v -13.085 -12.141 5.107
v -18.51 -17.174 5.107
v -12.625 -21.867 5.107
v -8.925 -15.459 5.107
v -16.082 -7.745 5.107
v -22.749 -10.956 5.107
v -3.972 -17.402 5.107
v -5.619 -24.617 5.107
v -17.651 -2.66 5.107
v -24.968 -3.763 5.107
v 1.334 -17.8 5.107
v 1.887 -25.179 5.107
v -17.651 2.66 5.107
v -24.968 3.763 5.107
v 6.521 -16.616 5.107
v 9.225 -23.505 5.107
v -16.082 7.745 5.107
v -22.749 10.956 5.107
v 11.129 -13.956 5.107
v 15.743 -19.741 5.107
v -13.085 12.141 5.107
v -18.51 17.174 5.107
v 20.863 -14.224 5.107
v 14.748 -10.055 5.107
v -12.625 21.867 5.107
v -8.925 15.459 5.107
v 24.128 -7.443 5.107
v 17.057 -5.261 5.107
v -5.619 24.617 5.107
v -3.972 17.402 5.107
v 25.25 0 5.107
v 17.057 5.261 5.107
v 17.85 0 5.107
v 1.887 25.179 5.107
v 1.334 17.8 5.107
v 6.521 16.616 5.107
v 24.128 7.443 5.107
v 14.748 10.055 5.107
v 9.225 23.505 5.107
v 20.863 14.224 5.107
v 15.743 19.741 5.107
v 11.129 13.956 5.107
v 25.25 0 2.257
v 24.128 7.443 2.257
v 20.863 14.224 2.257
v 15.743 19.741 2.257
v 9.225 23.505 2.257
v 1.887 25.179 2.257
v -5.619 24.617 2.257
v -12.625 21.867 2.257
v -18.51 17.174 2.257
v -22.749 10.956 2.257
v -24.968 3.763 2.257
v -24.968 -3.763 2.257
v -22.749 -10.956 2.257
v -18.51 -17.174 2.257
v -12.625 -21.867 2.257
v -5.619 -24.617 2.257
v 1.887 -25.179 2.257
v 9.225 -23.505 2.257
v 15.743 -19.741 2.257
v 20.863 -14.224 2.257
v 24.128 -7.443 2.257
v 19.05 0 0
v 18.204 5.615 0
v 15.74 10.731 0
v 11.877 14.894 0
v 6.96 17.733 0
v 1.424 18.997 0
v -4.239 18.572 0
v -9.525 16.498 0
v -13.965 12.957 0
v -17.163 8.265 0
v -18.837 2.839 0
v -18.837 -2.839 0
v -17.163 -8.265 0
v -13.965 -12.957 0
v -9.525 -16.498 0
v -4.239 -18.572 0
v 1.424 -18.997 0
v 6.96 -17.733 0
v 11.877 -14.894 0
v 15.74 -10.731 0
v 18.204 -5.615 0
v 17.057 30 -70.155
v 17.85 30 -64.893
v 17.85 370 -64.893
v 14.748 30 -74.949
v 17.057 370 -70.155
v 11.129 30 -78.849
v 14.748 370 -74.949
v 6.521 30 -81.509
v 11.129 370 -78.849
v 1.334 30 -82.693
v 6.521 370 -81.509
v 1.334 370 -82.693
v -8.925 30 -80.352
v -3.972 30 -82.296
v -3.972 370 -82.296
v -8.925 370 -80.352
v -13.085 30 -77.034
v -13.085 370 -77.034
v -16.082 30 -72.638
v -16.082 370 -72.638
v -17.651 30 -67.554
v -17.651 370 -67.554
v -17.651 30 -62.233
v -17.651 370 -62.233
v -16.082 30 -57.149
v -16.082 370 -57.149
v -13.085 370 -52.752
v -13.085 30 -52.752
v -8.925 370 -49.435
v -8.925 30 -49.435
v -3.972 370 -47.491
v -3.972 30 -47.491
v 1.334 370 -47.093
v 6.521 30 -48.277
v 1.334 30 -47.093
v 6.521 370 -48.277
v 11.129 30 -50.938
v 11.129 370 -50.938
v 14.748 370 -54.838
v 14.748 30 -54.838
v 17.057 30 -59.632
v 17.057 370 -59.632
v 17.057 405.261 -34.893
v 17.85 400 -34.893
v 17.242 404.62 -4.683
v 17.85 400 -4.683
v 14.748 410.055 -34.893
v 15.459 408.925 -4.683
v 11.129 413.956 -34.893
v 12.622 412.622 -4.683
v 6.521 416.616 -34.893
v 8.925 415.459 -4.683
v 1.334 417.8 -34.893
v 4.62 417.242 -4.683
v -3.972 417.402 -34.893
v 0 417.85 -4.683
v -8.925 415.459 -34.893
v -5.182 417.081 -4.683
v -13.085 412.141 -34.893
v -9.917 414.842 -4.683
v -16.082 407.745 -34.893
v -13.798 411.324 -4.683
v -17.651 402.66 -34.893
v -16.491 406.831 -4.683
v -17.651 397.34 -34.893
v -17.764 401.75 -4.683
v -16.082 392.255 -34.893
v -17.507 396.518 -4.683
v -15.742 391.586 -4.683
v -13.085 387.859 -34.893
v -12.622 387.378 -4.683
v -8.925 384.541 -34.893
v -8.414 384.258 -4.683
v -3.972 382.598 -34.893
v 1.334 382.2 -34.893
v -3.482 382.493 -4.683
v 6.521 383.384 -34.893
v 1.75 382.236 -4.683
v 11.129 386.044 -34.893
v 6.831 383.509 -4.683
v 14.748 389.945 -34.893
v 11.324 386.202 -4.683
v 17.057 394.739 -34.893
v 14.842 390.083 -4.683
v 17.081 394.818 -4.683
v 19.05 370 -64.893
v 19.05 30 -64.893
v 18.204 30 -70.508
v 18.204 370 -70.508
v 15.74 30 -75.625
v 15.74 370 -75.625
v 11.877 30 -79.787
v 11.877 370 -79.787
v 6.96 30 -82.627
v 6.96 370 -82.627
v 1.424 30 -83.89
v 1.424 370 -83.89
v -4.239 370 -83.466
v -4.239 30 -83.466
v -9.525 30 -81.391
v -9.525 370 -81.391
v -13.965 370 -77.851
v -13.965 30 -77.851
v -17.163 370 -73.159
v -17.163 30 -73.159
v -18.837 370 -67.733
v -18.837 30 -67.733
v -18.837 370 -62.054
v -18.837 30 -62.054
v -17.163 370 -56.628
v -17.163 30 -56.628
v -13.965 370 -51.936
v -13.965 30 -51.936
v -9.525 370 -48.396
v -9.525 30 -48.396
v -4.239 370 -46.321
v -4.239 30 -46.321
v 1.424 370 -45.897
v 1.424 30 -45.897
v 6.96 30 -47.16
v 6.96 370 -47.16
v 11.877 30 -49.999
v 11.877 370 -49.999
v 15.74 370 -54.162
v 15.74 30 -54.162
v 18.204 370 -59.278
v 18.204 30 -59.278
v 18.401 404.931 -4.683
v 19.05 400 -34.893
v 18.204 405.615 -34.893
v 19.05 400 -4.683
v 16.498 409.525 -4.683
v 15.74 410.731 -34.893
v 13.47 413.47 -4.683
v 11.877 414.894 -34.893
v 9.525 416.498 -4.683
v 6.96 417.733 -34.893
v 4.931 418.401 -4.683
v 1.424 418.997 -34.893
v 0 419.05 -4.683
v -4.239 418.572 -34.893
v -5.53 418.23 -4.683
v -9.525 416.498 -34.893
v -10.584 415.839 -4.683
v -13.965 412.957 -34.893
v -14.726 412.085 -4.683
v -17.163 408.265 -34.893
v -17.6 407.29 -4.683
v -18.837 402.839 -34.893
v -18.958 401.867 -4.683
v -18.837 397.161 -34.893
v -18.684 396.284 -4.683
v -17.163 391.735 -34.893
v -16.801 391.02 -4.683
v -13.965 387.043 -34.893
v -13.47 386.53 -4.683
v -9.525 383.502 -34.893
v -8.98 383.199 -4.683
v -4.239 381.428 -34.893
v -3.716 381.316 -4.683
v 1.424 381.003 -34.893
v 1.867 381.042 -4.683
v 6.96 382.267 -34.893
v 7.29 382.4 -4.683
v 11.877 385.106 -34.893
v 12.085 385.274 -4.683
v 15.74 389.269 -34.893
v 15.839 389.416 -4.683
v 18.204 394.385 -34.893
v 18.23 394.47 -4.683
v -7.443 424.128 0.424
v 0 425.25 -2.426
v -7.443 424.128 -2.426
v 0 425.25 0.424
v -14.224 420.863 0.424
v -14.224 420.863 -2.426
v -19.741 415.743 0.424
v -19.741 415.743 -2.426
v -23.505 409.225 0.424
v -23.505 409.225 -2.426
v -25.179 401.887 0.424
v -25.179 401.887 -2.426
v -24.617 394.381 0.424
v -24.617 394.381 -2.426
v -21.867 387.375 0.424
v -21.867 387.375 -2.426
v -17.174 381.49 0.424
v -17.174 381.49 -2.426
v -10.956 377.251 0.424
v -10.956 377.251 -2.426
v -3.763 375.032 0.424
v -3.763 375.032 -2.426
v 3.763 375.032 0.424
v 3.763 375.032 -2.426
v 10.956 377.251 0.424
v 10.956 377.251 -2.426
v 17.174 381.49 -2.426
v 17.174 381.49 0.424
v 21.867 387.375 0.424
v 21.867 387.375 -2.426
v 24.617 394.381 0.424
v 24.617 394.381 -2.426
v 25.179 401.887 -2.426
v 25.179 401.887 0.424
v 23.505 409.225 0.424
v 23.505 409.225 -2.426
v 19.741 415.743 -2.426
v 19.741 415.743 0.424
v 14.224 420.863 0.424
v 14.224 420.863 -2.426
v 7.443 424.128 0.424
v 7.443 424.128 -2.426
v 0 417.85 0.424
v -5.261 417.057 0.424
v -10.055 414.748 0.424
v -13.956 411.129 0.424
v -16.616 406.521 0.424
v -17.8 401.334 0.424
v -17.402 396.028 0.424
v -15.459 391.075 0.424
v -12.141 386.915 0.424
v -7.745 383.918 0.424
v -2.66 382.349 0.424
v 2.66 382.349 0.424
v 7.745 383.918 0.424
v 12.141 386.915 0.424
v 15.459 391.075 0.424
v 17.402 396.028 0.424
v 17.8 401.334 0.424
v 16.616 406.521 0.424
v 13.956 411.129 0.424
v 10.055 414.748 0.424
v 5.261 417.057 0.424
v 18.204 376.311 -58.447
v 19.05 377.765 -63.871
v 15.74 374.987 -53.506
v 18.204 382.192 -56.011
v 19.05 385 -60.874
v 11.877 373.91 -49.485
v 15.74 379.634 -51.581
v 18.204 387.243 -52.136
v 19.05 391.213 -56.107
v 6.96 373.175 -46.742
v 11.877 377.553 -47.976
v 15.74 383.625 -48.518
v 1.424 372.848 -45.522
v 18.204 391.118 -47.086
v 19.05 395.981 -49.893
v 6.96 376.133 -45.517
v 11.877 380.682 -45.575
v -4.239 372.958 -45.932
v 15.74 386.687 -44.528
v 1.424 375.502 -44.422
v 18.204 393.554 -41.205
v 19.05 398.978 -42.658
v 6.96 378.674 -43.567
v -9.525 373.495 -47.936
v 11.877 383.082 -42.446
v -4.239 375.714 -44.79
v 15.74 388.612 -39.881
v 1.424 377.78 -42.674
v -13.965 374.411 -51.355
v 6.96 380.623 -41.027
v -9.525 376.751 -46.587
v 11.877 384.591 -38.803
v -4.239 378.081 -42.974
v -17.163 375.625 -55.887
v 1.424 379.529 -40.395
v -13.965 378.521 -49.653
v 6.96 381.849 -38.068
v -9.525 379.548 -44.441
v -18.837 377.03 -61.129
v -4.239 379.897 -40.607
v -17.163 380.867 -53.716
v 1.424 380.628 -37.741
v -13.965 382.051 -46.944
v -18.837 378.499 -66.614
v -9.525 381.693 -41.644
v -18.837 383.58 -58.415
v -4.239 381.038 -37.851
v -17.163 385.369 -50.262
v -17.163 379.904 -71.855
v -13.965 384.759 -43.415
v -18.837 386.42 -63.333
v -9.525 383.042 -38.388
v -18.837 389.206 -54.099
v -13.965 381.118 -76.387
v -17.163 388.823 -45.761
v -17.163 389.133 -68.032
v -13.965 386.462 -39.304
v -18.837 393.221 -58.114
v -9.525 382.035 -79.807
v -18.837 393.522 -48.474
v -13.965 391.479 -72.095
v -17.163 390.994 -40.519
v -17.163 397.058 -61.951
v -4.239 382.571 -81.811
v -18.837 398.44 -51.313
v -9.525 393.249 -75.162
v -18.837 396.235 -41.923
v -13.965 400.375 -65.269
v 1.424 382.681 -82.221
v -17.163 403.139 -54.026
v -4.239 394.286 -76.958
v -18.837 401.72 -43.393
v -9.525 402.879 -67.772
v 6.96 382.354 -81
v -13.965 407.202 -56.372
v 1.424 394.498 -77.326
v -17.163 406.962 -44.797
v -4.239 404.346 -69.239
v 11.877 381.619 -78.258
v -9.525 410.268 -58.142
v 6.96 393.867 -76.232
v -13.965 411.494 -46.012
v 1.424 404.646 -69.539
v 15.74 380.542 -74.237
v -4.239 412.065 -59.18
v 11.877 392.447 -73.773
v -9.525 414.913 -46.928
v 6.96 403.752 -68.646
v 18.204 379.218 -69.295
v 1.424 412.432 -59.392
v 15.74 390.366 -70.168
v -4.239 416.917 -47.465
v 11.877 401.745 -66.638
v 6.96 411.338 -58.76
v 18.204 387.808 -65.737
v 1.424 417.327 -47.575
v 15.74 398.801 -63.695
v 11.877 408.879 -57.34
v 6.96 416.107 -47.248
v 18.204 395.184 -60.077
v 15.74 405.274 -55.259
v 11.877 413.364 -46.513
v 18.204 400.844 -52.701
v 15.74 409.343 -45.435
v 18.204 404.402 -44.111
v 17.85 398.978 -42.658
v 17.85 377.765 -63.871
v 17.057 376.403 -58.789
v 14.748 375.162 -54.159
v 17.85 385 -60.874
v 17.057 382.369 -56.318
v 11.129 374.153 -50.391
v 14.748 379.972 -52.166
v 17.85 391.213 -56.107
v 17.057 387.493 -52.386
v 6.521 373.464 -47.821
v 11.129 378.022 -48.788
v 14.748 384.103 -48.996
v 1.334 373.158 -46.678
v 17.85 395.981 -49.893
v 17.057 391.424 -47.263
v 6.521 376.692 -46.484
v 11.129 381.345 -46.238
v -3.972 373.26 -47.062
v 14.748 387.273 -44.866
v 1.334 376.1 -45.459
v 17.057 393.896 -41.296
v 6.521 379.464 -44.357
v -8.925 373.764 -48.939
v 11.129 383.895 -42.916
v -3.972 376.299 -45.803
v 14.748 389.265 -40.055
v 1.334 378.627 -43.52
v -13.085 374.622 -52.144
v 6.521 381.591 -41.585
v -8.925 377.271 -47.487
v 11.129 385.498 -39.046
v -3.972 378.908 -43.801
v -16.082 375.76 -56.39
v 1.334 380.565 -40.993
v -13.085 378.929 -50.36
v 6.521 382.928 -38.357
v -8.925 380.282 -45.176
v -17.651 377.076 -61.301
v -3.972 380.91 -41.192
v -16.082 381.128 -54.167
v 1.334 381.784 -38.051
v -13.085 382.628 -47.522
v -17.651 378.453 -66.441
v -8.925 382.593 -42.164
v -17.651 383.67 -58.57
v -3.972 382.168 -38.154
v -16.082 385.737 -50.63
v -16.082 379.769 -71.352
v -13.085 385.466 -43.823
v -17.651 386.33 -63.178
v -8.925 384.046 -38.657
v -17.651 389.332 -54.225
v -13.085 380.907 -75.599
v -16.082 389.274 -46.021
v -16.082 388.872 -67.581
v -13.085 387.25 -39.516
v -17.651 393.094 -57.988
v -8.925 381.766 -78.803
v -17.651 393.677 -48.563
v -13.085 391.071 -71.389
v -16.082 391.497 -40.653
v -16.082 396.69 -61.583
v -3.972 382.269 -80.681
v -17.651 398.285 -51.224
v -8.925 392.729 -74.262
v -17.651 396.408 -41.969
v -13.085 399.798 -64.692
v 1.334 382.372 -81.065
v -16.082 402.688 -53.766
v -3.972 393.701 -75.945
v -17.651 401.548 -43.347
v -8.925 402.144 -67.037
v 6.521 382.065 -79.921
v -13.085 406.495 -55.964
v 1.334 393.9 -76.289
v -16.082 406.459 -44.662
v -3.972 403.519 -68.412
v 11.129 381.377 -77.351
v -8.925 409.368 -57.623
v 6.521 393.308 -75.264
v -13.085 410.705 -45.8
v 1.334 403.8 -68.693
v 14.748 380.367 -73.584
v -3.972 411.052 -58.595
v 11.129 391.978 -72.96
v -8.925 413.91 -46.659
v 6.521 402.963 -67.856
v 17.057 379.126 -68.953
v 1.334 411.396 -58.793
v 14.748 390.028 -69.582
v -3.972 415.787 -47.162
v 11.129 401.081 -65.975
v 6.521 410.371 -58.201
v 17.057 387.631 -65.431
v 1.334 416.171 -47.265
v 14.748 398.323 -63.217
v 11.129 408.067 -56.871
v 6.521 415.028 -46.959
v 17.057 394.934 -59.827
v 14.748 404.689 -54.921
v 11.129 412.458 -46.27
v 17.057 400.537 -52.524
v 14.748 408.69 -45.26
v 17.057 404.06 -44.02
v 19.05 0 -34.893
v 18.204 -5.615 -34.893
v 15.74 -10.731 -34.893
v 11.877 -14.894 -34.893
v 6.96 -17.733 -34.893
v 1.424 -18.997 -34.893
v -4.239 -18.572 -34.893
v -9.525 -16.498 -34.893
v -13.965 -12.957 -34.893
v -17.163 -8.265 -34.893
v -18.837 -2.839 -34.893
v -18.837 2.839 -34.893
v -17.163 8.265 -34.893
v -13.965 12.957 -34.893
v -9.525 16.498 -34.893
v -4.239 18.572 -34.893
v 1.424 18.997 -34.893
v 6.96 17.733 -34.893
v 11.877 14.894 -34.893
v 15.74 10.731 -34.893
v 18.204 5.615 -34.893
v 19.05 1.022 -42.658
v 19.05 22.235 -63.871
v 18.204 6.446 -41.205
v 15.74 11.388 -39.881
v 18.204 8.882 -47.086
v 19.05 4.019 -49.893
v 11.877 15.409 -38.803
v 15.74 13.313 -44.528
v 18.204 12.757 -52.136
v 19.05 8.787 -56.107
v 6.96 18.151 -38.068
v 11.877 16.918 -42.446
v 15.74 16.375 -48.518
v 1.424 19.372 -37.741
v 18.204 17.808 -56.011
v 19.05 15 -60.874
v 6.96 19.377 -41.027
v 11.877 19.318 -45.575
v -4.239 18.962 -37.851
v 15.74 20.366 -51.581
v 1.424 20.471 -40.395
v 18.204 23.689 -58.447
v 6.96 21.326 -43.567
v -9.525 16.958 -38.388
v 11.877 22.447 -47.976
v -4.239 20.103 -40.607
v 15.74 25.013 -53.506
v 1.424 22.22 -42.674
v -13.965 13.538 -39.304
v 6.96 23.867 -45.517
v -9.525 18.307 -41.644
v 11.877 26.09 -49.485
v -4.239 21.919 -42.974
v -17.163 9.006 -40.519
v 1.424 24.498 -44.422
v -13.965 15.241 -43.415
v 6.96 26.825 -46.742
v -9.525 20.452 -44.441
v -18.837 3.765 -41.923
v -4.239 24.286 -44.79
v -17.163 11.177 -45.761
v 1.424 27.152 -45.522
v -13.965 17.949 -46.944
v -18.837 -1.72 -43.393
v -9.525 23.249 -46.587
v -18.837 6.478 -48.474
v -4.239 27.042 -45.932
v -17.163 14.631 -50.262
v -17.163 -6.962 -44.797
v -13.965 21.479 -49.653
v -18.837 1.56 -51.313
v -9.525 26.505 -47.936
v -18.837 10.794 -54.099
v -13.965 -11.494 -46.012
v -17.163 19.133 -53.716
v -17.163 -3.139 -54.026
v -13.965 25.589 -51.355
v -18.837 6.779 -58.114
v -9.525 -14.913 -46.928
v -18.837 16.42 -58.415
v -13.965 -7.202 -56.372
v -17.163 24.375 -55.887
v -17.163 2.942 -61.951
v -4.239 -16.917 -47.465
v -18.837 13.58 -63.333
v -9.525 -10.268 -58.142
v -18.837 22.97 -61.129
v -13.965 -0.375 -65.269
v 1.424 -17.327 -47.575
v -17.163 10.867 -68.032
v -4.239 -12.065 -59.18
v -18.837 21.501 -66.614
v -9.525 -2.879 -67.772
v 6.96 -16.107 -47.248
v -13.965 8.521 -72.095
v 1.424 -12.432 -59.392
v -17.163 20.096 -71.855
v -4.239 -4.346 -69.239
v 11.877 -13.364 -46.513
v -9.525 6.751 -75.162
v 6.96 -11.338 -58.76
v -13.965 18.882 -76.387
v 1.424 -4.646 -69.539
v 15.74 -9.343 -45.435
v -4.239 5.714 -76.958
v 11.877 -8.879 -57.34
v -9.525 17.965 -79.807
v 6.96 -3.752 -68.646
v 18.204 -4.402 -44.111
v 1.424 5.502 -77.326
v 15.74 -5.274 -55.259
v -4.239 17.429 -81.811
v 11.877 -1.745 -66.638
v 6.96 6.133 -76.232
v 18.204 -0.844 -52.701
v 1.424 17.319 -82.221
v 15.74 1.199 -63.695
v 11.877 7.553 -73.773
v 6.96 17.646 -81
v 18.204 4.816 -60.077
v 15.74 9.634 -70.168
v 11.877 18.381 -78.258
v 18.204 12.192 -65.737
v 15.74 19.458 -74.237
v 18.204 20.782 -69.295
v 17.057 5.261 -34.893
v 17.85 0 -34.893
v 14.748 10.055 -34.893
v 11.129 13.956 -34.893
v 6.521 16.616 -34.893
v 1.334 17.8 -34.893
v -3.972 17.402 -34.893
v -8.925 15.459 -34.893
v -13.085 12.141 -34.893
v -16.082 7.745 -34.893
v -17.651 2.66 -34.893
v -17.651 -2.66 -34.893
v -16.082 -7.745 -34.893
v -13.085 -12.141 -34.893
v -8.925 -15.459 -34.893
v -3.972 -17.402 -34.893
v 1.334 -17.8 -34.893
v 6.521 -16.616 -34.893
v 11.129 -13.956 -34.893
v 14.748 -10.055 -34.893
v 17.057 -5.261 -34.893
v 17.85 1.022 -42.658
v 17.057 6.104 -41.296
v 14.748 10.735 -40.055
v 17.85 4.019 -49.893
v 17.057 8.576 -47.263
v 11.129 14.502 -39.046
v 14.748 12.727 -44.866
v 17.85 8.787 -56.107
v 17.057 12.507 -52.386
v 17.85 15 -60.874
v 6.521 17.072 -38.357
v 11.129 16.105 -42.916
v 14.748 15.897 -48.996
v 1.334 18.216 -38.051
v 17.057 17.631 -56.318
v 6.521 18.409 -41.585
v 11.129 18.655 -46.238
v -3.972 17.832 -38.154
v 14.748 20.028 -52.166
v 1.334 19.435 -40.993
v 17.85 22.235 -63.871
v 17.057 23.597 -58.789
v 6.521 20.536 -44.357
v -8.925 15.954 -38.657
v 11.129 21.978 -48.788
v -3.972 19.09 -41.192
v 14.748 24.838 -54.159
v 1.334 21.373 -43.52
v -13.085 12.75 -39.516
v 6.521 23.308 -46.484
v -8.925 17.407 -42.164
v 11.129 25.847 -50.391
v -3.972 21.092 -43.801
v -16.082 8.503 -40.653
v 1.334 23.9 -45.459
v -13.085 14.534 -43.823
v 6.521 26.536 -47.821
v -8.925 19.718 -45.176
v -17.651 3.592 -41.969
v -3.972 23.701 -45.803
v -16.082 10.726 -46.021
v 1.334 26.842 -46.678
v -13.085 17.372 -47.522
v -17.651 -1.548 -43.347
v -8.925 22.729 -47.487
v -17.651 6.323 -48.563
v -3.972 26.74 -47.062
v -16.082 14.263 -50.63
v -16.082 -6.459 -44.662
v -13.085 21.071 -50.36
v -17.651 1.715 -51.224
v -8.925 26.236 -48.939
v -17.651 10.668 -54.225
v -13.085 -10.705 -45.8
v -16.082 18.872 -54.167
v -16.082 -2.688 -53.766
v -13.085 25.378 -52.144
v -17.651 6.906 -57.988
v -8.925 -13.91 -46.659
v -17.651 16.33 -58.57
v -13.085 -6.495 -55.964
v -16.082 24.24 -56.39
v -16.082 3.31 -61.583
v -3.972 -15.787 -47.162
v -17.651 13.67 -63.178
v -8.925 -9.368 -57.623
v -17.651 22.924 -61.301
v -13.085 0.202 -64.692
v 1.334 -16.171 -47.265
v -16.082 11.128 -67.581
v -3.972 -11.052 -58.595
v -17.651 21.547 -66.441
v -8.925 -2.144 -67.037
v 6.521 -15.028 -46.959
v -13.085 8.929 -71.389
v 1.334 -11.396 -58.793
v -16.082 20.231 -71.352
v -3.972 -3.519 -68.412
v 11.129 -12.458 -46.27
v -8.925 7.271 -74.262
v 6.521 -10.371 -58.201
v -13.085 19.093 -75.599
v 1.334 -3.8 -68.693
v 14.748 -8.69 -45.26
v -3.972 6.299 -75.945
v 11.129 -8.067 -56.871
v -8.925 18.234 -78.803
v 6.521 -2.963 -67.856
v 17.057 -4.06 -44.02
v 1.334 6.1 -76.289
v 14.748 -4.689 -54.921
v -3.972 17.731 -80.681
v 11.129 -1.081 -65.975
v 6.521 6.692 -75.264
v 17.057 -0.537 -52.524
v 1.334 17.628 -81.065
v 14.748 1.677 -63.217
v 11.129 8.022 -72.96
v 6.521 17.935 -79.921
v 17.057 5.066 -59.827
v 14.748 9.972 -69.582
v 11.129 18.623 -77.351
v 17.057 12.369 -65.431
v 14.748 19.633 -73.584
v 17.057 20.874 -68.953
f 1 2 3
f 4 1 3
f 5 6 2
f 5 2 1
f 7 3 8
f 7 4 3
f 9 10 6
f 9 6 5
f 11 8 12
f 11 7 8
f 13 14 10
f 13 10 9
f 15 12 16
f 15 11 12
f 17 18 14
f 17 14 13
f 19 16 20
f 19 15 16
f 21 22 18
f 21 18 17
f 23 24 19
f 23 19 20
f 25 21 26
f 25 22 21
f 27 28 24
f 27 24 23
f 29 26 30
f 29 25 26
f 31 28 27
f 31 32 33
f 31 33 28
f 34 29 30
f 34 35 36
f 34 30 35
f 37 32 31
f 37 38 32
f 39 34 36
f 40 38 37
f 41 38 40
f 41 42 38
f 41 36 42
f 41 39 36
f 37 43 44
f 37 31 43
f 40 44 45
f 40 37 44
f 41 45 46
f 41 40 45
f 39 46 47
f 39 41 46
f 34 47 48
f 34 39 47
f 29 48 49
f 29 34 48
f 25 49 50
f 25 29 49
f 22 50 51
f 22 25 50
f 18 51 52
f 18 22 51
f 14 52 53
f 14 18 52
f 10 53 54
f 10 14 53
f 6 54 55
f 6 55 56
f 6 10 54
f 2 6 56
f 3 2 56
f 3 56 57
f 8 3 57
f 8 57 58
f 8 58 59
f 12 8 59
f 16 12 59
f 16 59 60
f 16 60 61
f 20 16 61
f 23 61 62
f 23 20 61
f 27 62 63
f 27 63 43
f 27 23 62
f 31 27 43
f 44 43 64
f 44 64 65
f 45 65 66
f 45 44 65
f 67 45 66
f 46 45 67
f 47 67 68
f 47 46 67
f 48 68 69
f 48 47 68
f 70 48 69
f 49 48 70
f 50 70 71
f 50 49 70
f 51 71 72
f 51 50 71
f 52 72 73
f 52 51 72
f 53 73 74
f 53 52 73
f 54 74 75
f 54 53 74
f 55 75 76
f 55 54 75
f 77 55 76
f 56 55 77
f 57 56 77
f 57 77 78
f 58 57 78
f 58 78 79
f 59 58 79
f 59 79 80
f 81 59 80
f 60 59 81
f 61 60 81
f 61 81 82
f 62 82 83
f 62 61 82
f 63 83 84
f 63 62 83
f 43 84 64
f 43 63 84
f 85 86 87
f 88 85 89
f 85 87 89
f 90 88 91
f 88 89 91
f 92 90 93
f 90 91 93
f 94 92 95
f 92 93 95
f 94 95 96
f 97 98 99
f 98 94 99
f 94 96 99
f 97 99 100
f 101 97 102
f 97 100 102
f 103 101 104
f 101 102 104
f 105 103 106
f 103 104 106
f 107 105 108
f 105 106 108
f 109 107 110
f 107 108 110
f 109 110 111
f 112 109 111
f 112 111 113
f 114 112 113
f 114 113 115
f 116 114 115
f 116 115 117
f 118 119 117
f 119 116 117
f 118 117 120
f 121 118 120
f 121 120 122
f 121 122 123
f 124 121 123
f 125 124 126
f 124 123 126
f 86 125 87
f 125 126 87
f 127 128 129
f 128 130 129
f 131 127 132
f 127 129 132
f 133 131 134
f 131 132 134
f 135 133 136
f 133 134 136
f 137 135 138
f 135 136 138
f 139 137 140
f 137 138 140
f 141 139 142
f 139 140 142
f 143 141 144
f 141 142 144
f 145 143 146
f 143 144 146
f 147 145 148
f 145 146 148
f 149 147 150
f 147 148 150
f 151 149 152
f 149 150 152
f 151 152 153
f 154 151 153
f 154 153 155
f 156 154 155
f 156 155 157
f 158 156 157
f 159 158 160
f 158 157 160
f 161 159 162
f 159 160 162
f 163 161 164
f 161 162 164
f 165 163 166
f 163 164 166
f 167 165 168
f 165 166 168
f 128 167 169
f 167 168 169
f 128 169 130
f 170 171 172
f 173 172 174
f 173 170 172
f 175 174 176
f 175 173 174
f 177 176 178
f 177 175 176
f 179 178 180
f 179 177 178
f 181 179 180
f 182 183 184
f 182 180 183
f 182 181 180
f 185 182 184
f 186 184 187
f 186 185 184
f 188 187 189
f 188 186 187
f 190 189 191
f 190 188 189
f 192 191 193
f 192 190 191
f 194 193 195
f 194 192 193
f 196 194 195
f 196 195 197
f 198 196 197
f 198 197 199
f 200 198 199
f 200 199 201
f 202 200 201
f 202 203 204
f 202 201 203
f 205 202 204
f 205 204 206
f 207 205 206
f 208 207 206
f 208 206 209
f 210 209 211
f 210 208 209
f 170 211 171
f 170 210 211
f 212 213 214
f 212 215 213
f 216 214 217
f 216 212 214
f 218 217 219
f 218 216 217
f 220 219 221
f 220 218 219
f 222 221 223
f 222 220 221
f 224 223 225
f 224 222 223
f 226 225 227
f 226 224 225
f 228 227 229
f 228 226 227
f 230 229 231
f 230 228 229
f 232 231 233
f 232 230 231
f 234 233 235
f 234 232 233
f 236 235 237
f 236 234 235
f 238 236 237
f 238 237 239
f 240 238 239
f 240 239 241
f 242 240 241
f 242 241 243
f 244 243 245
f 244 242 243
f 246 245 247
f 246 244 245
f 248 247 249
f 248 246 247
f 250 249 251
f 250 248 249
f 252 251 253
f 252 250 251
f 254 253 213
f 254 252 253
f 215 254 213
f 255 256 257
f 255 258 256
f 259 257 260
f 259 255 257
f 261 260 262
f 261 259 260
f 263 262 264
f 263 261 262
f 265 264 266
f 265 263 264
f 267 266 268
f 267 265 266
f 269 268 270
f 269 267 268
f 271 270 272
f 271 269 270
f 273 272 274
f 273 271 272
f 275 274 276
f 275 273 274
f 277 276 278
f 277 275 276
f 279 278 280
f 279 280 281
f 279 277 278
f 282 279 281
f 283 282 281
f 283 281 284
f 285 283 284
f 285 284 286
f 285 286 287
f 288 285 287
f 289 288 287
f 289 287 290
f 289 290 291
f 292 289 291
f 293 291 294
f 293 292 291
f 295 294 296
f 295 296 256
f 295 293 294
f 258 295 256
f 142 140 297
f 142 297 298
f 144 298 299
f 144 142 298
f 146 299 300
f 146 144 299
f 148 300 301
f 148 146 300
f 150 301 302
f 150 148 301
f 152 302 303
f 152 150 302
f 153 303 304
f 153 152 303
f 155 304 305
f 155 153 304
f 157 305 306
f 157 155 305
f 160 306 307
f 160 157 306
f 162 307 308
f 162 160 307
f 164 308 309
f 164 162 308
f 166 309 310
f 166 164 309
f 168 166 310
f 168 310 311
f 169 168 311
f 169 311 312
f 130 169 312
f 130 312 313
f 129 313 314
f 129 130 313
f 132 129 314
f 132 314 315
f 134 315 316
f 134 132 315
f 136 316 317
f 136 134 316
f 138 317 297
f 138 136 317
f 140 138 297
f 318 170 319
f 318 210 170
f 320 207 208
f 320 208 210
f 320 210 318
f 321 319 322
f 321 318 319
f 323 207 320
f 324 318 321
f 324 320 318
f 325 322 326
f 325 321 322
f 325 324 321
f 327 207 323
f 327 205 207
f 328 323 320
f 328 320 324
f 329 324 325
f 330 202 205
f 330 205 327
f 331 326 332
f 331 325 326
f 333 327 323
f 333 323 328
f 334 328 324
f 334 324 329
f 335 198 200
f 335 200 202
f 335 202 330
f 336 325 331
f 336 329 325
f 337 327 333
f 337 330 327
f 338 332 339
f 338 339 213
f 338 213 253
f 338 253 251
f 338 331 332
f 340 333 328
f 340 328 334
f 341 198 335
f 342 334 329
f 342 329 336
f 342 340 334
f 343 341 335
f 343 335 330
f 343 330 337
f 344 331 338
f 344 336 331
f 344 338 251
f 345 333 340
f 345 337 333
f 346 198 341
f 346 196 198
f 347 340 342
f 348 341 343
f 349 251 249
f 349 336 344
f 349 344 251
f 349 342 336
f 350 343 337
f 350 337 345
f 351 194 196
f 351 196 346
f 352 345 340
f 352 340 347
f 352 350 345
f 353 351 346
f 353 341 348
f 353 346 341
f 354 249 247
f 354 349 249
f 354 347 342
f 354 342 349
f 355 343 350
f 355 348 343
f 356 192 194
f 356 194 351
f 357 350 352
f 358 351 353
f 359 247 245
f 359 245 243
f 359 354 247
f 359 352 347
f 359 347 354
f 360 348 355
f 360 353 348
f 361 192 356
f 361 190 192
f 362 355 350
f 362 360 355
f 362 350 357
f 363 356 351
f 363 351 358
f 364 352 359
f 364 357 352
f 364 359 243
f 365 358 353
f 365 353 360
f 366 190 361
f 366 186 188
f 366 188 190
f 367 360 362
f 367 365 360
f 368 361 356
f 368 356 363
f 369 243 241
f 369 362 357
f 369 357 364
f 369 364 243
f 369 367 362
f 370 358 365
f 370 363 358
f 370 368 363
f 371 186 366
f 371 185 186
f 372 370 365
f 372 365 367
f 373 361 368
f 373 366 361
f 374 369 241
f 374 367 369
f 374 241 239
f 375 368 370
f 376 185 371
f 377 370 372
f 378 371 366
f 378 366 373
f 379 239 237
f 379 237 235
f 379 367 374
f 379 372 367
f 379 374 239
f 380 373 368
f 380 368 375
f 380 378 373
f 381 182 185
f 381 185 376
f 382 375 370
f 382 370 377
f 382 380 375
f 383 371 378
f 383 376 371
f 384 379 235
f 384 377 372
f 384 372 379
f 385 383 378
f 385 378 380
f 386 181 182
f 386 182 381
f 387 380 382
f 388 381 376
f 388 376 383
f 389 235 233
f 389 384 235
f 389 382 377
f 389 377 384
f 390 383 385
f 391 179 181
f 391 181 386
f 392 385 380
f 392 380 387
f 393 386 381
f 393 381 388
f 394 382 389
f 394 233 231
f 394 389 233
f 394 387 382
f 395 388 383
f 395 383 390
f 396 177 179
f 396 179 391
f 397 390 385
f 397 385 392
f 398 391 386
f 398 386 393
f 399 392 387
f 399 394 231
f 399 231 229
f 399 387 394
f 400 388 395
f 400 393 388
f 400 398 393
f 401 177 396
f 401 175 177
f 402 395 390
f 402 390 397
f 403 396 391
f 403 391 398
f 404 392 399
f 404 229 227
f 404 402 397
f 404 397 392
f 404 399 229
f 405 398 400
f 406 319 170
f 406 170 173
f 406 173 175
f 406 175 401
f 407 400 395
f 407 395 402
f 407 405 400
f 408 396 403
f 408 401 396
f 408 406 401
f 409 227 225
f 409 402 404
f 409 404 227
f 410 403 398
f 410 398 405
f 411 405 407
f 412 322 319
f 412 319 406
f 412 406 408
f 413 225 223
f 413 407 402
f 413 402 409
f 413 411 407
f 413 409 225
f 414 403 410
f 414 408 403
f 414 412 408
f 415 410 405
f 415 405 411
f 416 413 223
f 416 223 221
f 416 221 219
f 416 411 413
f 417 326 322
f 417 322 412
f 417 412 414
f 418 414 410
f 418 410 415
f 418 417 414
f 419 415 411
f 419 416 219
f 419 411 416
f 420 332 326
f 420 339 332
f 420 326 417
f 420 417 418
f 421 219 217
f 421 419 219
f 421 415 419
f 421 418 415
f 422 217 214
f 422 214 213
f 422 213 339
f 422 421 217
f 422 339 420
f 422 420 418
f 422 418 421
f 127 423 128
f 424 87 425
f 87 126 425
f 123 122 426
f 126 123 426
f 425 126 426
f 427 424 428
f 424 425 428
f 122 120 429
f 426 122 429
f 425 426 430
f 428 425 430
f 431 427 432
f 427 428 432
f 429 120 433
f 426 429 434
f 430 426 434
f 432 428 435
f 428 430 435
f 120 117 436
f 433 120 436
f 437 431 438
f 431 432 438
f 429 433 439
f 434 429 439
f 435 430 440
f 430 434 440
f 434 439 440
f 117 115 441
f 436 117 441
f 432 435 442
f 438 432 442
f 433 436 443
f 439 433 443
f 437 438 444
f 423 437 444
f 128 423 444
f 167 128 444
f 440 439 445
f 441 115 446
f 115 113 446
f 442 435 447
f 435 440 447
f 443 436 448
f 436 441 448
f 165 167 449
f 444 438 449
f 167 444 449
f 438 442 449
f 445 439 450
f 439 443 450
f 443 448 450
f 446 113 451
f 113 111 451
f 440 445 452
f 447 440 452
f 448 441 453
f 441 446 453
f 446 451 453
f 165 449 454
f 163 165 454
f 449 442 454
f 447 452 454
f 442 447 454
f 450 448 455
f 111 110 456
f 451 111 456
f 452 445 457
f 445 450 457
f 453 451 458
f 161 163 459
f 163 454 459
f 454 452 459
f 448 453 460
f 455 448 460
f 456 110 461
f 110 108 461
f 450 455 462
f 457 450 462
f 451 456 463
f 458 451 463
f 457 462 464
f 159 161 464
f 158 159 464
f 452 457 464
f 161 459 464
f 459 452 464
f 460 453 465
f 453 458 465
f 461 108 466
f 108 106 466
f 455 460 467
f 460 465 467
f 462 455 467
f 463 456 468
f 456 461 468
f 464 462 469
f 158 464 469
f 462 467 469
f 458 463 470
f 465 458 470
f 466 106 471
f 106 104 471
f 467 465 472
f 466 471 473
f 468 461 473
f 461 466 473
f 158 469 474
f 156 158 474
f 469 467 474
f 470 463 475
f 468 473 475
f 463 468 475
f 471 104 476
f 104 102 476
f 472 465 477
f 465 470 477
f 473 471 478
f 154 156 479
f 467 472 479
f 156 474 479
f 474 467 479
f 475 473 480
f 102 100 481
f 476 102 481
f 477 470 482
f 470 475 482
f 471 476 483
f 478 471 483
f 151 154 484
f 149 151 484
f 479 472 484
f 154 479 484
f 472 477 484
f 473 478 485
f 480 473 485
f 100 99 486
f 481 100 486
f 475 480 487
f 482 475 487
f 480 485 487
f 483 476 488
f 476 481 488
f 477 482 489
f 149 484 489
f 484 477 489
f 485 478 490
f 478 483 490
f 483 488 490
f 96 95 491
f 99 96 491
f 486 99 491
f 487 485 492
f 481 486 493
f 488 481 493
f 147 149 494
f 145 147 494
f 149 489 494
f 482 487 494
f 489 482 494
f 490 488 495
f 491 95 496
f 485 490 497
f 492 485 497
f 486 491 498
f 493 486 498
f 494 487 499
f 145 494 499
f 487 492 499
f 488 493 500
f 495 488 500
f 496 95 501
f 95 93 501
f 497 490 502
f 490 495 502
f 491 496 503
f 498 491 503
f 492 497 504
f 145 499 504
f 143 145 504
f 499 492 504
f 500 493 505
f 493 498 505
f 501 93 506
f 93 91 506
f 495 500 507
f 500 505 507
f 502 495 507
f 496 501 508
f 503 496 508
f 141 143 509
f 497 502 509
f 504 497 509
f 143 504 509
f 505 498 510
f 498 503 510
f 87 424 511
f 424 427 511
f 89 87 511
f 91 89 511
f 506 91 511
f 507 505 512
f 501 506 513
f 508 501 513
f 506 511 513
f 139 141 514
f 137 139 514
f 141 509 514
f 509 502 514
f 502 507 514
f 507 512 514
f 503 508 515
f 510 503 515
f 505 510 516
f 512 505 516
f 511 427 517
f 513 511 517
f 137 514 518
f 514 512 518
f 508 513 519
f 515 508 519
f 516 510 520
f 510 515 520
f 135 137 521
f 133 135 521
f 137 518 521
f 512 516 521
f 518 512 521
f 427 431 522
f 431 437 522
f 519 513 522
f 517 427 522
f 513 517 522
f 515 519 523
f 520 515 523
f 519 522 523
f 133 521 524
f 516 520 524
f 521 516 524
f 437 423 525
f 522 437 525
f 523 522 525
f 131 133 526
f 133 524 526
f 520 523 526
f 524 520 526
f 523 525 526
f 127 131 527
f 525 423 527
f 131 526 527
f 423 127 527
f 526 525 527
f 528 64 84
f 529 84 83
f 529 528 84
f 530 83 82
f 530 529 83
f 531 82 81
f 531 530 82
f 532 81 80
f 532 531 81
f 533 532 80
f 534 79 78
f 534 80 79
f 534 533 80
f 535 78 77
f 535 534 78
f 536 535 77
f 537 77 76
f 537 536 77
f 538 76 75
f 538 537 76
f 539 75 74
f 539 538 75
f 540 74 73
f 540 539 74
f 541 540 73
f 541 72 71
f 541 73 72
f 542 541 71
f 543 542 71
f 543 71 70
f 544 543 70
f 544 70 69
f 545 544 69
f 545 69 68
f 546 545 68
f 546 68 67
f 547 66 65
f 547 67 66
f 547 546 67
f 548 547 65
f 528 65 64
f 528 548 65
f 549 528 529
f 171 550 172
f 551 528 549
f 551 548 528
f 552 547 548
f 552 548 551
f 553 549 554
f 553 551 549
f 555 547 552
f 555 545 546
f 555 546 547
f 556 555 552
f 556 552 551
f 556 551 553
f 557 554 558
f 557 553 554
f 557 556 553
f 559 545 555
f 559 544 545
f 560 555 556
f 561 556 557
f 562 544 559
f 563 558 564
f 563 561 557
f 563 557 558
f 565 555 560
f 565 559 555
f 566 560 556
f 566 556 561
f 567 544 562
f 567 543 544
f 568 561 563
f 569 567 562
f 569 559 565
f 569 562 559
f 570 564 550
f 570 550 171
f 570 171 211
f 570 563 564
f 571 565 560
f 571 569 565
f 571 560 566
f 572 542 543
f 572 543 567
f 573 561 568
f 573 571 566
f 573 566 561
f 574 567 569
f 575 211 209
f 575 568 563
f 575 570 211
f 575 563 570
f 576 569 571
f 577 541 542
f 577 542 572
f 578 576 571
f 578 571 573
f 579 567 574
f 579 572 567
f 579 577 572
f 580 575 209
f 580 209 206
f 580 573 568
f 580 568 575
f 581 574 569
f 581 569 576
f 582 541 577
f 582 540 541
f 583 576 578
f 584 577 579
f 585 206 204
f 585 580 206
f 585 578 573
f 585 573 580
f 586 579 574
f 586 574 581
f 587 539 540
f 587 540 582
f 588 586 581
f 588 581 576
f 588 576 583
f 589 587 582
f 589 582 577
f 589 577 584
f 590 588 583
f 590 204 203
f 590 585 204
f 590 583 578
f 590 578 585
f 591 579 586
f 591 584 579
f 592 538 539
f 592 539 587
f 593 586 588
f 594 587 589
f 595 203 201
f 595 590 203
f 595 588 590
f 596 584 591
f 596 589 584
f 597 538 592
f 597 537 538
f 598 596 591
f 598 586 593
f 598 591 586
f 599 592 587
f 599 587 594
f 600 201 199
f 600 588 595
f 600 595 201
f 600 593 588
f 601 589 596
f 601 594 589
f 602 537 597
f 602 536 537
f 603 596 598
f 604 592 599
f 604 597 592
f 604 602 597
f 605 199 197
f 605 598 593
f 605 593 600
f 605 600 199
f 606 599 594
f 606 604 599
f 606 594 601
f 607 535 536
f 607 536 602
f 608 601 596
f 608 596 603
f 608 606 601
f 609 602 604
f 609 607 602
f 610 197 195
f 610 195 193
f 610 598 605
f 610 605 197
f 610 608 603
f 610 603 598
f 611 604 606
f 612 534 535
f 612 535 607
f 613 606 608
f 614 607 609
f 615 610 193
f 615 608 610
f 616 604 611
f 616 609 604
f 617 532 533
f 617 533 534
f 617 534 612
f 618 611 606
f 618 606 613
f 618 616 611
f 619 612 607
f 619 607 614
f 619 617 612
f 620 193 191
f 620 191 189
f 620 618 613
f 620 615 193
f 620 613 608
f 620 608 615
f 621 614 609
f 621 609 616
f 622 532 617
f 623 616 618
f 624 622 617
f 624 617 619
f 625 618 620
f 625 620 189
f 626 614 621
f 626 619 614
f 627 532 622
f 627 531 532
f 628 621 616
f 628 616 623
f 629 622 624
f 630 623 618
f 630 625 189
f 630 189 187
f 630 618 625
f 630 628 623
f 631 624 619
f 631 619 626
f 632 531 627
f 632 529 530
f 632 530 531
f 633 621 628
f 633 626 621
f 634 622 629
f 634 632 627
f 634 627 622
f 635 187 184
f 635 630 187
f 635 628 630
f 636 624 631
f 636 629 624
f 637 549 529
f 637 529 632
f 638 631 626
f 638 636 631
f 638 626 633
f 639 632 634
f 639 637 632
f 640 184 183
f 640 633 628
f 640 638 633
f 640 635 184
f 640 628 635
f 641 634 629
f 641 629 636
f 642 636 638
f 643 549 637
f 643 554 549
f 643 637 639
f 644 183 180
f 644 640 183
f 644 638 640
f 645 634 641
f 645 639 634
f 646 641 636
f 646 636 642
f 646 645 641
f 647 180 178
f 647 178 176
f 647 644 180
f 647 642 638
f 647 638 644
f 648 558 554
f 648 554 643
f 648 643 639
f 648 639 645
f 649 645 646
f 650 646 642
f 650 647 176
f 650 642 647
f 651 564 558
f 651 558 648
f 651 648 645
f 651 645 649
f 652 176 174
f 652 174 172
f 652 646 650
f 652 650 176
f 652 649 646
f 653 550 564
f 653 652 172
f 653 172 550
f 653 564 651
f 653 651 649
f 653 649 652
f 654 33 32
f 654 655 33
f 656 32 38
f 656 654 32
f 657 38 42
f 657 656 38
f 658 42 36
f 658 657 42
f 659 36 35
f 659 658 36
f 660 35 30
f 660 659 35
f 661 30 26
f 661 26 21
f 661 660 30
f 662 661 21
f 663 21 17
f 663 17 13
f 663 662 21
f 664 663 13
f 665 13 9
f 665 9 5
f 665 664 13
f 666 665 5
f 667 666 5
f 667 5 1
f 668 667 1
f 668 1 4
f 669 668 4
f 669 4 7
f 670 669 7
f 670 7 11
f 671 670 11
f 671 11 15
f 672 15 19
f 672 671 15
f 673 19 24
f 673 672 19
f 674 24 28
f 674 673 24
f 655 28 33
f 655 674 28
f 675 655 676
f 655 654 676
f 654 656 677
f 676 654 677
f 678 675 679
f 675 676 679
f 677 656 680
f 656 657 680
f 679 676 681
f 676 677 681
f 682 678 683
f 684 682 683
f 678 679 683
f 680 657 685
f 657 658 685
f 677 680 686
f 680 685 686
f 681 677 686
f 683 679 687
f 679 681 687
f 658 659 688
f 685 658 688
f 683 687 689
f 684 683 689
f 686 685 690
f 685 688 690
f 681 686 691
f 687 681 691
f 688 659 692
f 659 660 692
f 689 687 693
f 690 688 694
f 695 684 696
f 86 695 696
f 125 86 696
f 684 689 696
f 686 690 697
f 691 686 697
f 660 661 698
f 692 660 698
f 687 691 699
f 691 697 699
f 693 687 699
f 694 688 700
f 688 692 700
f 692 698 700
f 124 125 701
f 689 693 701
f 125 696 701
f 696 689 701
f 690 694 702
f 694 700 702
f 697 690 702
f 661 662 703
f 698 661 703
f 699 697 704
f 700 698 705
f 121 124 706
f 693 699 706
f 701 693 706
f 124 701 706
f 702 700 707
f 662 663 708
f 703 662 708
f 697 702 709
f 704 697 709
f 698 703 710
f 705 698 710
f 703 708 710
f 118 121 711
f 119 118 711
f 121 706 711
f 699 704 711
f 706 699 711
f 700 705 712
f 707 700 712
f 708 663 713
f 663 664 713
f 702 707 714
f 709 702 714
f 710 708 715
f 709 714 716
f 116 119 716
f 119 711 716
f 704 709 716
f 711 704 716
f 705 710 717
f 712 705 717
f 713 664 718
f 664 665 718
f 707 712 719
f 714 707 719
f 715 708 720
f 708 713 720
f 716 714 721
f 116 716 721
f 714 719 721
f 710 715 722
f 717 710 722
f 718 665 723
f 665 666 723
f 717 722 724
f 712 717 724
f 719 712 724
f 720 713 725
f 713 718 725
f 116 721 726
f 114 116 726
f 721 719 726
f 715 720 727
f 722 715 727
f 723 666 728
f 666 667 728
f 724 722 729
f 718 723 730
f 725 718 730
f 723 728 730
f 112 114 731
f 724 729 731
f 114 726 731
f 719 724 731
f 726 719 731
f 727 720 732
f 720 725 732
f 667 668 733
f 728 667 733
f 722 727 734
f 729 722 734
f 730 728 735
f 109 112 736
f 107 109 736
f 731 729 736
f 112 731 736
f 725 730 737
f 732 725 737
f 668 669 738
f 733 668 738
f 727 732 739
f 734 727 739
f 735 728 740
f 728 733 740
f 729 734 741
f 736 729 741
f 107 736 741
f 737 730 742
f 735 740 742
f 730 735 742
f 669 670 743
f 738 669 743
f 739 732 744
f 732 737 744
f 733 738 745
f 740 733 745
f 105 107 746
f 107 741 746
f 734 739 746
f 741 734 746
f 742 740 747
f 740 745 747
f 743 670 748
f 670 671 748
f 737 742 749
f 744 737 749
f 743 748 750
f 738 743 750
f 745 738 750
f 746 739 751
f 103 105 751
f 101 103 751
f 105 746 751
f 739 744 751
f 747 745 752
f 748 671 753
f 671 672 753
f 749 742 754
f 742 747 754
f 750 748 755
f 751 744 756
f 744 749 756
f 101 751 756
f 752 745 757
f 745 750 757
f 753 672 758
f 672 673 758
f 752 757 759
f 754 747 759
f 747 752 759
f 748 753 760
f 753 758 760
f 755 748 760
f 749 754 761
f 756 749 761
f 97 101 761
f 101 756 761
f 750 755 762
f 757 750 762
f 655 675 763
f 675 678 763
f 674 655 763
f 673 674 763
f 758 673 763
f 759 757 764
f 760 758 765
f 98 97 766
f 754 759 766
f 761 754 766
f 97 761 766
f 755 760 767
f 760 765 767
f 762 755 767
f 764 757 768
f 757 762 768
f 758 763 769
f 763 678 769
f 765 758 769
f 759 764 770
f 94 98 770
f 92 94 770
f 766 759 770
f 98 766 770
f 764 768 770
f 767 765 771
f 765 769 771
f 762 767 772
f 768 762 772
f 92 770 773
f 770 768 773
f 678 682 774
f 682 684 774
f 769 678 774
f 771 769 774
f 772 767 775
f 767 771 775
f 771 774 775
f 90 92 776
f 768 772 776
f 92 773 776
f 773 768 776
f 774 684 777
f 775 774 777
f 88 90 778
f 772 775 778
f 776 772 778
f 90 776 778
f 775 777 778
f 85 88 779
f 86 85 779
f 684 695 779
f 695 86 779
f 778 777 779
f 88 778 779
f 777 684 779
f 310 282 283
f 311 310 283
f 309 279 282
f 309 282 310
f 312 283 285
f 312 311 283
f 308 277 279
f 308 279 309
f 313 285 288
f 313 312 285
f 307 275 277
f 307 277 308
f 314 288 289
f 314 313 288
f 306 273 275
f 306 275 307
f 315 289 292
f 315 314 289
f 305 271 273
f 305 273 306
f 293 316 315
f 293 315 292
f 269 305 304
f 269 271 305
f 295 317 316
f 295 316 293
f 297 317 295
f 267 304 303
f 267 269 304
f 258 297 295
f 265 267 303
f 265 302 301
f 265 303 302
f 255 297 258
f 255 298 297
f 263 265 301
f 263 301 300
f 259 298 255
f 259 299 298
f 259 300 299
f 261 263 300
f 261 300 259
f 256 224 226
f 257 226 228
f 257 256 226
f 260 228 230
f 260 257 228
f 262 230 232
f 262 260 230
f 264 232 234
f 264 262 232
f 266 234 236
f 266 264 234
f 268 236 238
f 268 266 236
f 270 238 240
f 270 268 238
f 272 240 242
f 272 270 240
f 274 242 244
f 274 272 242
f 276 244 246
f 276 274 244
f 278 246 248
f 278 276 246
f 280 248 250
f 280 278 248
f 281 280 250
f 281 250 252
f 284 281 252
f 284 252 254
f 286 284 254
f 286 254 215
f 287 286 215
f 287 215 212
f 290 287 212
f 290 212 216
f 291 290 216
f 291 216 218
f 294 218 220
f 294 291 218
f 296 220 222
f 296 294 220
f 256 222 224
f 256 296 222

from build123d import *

# Parameters (mm, degrees)
F2_R   = 19.05
F2_R_2 = 17.85


with BuildPart() as f1:
    # F0 (on Front) → F1 (revolve)
    with BuildSketch(Plane.XZ):
        Polygon((17.85, 5.1066154525), (17.85, 0), (19.05, 0), (25.25, 2.2566154525), (25.25, 5.1066154525), align=None)
    revolve(axis=Axis((0, 0, 5.6449943222), (0, 0, 1)))

    # F4: sweep along a path in F3
    with BuildLine(Plane.YZ) as f4_path:
        Line((0, 0), (0, -34.8933845475))
        ThreePointArc((0, -34.8933845475), (8.7867965644, -56.1065879831), (30, -64.8933845475))
        Line((30, -64.8933845475), (370, -64.8933845475))
        ThreePointArc((370, -64.8933845475), (391.2132034356, -56.1065879831), (400, -34.8933845475))
        Line((400, -34.8933845475), (400, -4.6830023639))
    # F2 (on Top) → F4 (sweep)
    with BuildSketch(Plane.XY):
        Circle(F2_R)
        Circle(F2_R_2, mode=Mode.SUBTRACT)
    sweep(path=f4_path.line)

    # F5 (on Right) → F6 (revolve)
    with BuildSketch(Plane.YZ):
        Polygon((417.85, 0.4236130886), (417.85, -4.6830023639), (419.05, -4.6830023639), (425.25, -2.4263869114), (425.25, 0.4236130886), align=None)
    revolve(axis=Axis((0, 400, -19.7881934557), (0, 0, 1)))


solid = f1.part
